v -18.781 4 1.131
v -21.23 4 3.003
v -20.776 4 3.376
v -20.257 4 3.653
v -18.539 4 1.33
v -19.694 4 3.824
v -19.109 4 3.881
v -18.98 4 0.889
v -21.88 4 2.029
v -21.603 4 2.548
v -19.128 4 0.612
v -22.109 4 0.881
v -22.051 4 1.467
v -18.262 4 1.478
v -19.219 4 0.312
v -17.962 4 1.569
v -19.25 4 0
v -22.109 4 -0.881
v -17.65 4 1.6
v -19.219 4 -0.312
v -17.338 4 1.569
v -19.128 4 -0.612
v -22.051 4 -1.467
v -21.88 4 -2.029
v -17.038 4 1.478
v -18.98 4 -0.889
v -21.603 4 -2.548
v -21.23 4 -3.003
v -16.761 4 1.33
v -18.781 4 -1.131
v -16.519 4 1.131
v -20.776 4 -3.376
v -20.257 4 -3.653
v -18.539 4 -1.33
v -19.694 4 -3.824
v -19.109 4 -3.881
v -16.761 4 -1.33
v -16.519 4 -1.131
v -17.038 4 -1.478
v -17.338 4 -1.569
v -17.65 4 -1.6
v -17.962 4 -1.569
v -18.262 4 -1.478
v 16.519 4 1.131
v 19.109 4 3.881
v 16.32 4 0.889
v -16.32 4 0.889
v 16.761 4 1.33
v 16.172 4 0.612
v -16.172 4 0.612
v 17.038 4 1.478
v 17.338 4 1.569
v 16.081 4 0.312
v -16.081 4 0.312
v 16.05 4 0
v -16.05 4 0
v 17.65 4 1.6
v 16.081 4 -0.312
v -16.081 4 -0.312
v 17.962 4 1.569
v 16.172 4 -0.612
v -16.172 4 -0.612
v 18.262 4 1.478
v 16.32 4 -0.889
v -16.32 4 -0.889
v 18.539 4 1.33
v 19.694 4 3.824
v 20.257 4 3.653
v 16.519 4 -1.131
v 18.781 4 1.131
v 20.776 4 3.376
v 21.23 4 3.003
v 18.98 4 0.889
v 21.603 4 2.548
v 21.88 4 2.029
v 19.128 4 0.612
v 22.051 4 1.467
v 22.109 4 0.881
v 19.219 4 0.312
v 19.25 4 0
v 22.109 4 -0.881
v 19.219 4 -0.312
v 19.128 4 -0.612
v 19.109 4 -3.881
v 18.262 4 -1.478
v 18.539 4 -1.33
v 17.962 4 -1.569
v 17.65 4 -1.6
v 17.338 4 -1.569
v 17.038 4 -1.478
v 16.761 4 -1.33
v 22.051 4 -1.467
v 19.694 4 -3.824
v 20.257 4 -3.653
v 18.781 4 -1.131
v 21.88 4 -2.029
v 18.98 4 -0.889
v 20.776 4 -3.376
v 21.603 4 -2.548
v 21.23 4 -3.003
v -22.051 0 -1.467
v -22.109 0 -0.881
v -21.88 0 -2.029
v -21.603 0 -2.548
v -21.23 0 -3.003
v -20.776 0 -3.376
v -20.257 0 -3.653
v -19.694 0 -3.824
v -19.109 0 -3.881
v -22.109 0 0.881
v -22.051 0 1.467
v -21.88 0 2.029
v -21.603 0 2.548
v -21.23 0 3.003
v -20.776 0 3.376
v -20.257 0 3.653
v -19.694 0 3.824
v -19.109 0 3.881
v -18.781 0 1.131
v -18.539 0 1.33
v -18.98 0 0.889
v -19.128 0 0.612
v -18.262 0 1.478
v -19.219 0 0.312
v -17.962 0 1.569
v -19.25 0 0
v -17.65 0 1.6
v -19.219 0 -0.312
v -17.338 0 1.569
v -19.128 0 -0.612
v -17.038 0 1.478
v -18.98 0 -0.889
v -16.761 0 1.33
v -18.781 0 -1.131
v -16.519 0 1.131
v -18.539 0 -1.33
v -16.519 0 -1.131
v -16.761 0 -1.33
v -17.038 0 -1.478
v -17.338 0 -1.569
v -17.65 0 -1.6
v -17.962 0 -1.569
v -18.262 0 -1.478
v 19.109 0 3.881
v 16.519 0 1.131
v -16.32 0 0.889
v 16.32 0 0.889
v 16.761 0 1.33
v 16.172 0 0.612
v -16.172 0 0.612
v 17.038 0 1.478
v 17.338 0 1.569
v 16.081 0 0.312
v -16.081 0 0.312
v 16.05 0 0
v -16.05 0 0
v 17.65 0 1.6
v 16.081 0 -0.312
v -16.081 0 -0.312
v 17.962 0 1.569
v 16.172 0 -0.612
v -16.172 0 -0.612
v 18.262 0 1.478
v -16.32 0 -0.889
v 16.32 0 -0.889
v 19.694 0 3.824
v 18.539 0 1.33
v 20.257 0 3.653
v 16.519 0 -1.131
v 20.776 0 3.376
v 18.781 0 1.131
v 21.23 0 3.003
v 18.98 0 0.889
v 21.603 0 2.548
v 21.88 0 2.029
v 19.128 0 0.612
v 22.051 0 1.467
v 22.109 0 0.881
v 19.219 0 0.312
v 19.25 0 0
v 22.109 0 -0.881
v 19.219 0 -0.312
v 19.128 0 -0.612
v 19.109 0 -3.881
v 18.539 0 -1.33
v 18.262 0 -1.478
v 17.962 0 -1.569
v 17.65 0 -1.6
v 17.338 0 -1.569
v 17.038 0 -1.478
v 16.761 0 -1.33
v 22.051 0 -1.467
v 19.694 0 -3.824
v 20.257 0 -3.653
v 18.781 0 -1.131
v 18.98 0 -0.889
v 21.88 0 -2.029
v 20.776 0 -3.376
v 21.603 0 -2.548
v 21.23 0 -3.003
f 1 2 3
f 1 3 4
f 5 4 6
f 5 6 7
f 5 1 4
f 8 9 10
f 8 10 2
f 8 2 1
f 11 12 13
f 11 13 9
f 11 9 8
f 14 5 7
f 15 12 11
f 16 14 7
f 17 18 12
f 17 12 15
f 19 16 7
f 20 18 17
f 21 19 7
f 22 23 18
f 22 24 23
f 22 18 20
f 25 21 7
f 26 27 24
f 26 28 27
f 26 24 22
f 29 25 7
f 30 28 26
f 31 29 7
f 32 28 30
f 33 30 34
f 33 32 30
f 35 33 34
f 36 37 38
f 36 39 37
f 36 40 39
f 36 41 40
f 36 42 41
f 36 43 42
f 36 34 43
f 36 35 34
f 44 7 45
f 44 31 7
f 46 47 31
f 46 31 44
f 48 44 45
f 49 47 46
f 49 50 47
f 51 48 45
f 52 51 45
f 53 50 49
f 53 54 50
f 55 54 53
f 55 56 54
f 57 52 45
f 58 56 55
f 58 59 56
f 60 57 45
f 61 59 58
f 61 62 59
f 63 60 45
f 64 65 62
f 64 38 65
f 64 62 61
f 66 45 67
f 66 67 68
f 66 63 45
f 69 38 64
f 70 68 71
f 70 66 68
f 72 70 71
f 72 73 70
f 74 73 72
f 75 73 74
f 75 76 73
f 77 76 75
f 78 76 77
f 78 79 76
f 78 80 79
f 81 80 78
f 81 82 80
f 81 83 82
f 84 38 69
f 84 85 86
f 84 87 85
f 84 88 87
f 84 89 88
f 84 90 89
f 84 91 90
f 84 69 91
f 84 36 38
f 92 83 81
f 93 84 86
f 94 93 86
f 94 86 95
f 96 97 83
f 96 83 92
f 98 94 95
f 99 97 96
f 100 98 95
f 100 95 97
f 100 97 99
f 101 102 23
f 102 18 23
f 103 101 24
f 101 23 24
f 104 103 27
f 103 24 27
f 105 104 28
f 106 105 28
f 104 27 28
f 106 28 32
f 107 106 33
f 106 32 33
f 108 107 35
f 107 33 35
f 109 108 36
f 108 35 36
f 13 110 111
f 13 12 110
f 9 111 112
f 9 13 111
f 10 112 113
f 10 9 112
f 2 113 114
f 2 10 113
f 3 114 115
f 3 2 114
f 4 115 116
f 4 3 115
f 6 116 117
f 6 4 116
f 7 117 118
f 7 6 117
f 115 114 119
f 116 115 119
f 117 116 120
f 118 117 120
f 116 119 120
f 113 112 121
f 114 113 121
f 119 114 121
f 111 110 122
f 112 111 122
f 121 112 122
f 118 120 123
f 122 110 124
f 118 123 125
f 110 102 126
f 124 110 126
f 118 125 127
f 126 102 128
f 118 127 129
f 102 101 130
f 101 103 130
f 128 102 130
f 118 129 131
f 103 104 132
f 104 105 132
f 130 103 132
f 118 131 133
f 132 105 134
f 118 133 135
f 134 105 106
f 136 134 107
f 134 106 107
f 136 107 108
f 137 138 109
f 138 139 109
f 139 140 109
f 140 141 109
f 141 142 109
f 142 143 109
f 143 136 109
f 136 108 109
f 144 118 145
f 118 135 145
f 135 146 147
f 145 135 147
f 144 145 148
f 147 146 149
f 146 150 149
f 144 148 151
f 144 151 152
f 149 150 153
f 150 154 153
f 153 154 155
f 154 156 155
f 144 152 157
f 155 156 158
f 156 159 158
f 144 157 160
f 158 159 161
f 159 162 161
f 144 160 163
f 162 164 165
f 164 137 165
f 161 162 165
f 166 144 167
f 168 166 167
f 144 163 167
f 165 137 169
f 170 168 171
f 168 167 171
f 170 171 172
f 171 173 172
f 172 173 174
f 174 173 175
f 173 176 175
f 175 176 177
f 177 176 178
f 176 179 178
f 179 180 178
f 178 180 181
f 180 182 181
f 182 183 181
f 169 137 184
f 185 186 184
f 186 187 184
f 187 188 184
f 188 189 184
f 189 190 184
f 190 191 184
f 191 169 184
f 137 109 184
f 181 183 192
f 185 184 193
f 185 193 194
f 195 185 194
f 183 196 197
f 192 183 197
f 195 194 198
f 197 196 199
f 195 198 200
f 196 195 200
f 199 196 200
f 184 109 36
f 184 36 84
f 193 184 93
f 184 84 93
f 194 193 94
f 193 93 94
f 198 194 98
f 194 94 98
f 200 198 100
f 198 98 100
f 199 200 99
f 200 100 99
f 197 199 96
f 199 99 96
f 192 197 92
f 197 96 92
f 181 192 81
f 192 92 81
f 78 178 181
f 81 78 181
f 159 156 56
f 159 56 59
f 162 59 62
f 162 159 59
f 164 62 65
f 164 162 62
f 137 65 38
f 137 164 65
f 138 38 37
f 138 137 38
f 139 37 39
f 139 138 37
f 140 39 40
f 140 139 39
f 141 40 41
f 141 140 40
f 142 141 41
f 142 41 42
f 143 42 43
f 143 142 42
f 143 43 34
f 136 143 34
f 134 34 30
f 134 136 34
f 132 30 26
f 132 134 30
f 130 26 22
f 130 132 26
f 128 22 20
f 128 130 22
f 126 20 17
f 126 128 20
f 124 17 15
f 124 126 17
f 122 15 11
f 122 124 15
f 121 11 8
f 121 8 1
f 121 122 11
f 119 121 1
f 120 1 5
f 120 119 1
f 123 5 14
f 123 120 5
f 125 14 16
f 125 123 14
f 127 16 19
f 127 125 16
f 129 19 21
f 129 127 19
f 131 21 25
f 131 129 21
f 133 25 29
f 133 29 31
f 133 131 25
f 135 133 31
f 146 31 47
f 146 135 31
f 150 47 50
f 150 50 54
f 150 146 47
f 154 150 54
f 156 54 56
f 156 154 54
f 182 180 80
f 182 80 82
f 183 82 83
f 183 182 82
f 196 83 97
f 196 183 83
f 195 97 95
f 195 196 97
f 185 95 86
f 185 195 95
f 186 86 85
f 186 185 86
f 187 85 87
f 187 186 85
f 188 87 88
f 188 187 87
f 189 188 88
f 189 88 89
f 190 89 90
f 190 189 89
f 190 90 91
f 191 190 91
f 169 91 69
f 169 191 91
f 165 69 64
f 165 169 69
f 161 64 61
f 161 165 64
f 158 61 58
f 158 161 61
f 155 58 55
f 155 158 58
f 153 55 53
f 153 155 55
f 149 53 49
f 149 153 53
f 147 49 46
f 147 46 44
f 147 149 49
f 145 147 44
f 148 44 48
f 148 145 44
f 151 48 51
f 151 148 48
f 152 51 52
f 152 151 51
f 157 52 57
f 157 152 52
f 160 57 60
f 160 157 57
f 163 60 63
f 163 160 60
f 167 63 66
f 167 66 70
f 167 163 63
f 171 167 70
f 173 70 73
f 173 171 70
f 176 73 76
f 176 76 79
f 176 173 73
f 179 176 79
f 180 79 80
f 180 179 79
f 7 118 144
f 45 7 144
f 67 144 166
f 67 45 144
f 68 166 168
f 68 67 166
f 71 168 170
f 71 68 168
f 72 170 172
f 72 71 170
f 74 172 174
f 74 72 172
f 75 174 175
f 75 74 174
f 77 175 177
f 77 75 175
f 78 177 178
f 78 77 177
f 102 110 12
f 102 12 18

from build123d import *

# Parameters (mm, degrees)
SKETCH_1_W      = 44.217702276
SKETCH_1_H      = 7.762687128
SKETCH_1_R      = 1.6
EXTRUDE_1_DEPTH = 4
FILLET_1_R      = 3


with BuildPart() as part:
    # 草图1 → 凸台-拉伸1 (new body)
    with BuildSketch(Plane(origin=(0, 0, 0), x_dir=(1, 0, 0), z_dir=(0, 1, 0))):
        Rectangle(SKETCH_1_W, SKETCH_1_H)
        with Locations((-17.65, 0)):
            Circle(SKETCH_1_R, mode=Mode.SUBTRACT)
        with Locations((17.65, 0)):
            Circle(SKETCH_1_R, mode=Mode.SUBTRACT)
    extrude(amount=EXTRUDE_1_DEPTH)

    # 圆角1
    fillet_1_edges = [part.edges().sort_by_distance(p)[0] for p in [
        (-22.108851138, 2, -3.881343564),
        (22.108851138, 2, -3.881343564),
        (22.108851138, 2, 3.881343564),
        (-22.108851138, 2, 3.881343564),
    ]]
    fillet(fillet_1_edges, radius=FILLET_1_R)


solid = part.part
